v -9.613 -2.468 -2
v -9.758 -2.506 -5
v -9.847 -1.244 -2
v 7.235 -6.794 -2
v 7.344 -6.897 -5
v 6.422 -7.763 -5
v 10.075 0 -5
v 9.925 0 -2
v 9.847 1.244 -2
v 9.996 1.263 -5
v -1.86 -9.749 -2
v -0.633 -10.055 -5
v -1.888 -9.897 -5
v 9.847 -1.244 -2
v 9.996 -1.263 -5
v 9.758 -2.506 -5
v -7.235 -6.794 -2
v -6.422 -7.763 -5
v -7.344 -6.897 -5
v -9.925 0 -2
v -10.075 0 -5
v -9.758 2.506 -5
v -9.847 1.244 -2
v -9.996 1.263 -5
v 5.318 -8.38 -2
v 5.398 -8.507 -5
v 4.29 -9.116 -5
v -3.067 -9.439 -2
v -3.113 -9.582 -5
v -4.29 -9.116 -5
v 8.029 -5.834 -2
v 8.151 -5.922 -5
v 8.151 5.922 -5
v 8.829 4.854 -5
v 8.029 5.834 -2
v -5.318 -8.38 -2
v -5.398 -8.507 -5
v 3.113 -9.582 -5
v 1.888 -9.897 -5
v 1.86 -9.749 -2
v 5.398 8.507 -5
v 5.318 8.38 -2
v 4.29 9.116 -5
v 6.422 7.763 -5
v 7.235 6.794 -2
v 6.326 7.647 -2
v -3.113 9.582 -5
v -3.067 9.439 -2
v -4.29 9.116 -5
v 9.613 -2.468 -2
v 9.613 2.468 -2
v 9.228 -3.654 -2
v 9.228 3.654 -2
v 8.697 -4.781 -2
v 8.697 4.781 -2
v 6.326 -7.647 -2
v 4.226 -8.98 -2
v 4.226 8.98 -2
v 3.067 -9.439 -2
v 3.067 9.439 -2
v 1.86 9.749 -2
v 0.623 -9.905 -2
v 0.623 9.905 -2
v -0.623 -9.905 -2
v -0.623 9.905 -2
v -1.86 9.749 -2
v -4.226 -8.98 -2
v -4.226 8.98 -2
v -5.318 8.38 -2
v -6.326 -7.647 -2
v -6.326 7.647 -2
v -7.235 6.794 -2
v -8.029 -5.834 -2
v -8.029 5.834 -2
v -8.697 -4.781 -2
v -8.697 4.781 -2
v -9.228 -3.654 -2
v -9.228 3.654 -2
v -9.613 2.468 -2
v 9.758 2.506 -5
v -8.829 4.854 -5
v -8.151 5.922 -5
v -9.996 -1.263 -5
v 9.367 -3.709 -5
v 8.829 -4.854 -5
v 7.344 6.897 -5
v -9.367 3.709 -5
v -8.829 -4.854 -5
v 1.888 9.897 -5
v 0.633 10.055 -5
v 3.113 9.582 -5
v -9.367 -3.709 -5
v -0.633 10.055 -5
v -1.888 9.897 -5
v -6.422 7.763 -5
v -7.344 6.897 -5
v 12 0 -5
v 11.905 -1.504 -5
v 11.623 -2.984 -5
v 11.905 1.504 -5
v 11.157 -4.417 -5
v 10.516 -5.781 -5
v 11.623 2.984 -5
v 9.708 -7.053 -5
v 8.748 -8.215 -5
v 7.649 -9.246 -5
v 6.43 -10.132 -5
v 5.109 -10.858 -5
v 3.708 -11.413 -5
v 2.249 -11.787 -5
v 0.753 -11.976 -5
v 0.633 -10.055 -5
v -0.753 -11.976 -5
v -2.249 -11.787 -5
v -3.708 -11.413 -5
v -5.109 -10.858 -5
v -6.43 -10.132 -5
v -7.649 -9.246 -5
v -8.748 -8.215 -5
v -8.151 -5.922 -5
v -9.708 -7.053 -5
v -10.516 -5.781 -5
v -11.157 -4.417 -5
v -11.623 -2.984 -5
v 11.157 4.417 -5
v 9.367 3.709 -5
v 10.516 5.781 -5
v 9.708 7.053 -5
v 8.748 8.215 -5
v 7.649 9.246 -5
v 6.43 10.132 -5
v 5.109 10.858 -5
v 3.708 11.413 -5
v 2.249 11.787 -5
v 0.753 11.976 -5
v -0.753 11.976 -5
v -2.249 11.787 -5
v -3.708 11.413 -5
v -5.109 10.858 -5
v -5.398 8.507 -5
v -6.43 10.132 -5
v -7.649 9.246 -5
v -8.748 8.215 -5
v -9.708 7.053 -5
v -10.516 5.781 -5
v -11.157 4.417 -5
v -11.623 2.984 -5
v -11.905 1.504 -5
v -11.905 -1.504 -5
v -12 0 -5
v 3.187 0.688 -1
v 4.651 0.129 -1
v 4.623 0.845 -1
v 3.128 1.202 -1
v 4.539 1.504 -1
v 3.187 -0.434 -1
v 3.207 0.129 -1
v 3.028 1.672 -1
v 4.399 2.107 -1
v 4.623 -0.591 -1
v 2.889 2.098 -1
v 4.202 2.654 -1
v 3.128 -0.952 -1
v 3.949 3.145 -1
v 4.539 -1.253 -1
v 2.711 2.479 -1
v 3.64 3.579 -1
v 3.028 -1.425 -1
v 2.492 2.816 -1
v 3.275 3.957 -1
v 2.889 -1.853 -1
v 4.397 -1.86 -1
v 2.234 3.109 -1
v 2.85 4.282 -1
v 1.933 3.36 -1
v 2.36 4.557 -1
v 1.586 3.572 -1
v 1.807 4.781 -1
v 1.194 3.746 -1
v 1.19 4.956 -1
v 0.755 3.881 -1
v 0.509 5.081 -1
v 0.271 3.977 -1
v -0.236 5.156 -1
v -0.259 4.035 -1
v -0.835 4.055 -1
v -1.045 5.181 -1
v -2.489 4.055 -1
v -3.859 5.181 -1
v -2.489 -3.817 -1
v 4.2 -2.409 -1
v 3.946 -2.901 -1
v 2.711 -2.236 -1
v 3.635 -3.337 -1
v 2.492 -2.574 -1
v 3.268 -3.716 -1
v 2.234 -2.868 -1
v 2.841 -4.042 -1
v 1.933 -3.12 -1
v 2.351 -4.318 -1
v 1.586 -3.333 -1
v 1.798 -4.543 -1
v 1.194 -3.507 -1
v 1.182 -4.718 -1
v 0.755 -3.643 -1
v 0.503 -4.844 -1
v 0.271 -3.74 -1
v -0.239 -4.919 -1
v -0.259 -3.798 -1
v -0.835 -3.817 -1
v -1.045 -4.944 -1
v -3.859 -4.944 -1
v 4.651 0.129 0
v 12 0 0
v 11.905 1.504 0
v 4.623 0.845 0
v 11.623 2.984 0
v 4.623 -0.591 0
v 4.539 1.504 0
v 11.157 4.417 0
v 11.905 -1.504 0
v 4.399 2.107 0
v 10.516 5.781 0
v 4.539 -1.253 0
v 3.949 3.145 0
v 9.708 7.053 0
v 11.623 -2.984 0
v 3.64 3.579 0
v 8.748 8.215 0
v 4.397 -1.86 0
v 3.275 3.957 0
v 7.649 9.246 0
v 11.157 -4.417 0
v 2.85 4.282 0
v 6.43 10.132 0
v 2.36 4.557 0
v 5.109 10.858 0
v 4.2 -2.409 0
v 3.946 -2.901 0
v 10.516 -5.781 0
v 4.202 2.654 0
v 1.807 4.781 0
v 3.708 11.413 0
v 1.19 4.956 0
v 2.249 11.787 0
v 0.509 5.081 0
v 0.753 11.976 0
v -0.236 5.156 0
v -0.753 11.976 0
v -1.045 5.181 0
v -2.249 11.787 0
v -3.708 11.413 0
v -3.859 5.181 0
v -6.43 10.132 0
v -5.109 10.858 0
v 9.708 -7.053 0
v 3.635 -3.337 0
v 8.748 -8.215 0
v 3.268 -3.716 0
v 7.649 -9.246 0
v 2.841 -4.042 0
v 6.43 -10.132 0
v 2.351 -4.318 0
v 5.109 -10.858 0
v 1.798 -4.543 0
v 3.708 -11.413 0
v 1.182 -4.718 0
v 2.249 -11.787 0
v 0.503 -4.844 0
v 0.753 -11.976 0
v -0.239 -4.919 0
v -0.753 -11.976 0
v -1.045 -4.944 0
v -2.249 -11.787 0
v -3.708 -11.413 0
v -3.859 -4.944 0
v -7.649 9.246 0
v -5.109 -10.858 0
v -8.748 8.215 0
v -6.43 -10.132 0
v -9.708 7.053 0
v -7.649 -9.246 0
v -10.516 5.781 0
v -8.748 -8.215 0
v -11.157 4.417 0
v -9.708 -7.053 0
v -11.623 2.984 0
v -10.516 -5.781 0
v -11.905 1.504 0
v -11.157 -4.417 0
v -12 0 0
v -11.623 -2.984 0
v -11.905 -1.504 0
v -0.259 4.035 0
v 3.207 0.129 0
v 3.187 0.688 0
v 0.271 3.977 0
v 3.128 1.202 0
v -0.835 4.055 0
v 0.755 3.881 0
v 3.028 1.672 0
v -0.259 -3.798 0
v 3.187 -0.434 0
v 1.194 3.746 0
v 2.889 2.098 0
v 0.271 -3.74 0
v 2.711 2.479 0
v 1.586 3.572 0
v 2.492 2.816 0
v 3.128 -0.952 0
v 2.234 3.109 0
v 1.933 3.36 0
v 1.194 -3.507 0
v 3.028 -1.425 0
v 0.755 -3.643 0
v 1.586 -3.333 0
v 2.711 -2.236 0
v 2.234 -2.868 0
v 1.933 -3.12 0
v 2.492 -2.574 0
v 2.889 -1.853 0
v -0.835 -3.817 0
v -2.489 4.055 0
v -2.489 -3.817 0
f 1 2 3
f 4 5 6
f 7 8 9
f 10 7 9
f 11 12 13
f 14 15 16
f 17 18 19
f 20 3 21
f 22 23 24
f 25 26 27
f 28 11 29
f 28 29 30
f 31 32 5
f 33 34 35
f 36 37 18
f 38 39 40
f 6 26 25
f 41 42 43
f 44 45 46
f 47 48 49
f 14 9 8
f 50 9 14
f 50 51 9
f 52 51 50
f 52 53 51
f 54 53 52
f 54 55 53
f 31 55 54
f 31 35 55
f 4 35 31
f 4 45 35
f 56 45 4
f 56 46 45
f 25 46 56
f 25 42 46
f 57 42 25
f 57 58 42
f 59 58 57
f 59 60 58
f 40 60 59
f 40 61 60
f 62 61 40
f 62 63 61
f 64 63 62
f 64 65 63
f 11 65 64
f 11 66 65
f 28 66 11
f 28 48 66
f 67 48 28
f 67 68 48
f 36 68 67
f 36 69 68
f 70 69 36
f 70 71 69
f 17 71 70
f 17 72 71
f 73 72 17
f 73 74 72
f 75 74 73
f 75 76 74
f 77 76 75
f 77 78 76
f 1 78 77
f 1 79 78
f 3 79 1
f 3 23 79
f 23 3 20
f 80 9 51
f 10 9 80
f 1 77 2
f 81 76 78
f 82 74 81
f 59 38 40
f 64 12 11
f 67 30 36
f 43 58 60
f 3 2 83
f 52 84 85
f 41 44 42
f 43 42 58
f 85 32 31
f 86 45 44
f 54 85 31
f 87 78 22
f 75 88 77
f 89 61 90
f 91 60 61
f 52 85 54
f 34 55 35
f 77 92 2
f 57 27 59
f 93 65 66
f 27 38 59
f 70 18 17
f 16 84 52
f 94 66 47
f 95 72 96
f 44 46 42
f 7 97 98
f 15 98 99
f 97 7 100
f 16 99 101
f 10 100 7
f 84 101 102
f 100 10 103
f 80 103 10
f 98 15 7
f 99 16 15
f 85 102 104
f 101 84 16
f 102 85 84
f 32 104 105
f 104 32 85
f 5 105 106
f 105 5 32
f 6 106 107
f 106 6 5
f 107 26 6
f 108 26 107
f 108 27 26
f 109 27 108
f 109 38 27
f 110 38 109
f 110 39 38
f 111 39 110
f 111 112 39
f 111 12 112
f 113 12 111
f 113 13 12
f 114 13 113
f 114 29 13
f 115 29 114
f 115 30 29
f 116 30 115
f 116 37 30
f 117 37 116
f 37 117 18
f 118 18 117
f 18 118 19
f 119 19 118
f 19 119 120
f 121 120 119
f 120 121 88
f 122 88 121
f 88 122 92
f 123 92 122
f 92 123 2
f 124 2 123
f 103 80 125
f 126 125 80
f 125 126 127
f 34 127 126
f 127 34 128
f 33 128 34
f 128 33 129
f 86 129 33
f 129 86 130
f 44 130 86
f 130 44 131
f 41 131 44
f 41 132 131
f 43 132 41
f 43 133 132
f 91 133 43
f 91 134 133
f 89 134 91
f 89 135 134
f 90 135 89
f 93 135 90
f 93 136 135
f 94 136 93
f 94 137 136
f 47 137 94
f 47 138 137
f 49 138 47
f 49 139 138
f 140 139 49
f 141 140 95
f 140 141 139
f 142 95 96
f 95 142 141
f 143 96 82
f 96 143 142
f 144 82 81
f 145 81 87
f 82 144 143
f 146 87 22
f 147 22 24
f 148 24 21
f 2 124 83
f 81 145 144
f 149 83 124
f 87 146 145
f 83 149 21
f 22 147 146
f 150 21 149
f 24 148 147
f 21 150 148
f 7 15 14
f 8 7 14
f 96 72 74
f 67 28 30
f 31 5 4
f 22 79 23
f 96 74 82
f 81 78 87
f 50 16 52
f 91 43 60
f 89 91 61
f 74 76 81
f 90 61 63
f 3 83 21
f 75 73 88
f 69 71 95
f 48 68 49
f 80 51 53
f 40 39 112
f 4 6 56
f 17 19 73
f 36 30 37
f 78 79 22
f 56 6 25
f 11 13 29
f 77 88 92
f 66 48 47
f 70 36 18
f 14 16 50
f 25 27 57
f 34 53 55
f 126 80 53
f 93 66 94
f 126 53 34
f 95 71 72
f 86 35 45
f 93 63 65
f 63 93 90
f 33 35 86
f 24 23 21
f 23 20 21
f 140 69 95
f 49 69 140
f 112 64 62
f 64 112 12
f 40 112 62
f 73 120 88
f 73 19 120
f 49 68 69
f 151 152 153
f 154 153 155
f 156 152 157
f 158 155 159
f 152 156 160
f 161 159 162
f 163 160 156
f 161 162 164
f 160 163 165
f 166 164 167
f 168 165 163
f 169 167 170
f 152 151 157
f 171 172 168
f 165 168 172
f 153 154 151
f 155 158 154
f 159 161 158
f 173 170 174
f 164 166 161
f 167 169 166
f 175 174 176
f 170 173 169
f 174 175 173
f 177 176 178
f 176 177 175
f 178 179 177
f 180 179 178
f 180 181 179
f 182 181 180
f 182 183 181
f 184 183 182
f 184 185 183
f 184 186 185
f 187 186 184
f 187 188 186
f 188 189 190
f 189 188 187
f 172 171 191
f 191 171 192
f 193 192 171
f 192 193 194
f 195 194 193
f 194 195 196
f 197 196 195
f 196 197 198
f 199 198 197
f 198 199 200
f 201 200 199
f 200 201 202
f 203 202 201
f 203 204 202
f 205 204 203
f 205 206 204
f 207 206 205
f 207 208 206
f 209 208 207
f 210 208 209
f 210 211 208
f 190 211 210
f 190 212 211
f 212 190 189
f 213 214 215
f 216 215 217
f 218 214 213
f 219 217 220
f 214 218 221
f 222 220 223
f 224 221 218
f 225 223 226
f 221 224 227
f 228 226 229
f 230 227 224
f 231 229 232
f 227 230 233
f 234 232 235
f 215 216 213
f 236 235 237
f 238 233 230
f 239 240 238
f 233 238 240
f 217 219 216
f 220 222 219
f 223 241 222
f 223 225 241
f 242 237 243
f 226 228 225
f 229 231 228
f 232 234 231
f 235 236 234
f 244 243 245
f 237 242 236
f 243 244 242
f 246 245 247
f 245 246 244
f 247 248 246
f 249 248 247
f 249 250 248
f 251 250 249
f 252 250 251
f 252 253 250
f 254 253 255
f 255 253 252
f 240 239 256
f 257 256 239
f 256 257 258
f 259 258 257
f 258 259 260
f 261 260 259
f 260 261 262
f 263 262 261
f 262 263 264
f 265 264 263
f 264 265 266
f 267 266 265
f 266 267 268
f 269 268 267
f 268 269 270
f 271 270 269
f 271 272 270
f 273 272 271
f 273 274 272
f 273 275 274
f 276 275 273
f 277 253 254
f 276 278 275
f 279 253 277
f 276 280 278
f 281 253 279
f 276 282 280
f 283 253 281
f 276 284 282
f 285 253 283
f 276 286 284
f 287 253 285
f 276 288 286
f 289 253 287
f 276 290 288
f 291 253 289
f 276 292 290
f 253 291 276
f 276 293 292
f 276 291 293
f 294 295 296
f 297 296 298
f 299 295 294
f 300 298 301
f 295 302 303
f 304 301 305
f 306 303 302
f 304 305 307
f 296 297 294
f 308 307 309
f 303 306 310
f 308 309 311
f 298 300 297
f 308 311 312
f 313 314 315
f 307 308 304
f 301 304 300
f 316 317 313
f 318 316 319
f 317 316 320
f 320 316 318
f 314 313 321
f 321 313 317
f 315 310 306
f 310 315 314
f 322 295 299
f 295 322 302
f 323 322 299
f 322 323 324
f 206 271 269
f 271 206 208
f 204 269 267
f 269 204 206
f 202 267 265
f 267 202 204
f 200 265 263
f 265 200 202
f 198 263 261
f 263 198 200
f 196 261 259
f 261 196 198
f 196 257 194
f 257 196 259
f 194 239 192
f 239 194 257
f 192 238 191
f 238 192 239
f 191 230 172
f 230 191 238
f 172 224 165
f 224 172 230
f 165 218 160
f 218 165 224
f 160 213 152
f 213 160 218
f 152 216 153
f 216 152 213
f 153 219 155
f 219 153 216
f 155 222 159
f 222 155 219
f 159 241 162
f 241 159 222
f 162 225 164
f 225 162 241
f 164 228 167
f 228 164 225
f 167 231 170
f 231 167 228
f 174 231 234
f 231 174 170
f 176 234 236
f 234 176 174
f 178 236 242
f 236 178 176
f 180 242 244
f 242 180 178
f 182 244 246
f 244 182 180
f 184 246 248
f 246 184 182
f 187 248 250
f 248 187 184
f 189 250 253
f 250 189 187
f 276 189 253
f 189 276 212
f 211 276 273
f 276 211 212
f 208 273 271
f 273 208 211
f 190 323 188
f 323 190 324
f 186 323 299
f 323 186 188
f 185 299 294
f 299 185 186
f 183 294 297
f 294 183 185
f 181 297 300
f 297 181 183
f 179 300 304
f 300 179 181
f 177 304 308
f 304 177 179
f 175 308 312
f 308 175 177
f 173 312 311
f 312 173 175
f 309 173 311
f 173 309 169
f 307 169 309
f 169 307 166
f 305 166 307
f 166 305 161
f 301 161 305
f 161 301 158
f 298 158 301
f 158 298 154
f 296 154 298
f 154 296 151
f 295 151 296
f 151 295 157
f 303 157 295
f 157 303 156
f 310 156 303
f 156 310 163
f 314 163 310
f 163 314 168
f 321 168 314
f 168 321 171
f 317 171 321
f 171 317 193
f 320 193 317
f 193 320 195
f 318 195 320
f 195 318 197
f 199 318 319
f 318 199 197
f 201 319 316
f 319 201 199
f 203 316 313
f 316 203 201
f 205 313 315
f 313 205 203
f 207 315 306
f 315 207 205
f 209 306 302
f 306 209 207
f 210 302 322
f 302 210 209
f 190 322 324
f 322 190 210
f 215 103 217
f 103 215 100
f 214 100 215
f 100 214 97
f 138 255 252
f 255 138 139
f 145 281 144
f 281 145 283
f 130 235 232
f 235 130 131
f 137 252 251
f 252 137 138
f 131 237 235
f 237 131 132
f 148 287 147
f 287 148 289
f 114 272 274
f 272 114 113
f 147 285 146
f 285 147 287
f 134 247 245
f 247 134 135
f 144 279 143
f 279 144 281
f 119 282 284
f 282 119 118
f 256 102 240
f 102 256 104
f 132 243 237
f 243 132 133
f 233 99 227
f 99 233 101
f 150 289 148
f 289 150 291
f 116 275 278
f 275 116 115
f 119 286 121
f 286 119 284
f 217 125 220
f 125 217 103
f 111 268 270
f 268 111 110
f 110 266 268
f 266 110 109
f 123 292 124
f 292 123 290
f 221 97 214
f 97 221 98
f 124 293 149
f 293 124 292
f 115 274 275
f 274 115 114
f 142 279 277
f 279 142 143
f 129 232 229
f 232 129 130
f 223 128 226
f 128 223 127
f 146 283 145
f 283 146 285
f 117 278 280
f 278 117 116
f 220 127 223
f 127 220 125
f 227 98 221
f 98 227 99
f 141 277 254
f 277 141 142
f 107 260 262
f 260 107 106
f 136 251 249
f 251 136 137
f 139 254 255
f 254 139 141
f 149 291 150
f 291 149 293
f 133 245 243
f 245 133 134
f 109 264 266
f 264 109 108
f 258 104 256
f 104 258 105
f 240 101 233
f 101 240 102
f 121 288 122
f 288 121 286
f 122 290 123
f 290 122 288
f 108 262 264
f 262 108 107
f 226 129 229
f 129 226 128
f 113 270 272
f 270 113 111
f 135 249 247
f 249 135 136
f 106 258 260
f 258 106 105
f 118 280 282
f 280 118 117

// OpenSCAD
$fn = 50;

difference() {
	union() {
		translate(v = [0, 0, -5.0]) {
			cylinder(h = 5, r = 12.0);
		}
	}
	union() {
		#translate(v = [0, 0, -5.0]) {
			cylinder(h = 3, r1 = 10.075, r2 = 9.925);
		}
		translate(v = [0, 0, -1]) {
			linear_extrude(height = 1) {
				text(font = "Impact", halign = "center", size = 10, text = "D", valign = "center");
			}
		}
	}
}
